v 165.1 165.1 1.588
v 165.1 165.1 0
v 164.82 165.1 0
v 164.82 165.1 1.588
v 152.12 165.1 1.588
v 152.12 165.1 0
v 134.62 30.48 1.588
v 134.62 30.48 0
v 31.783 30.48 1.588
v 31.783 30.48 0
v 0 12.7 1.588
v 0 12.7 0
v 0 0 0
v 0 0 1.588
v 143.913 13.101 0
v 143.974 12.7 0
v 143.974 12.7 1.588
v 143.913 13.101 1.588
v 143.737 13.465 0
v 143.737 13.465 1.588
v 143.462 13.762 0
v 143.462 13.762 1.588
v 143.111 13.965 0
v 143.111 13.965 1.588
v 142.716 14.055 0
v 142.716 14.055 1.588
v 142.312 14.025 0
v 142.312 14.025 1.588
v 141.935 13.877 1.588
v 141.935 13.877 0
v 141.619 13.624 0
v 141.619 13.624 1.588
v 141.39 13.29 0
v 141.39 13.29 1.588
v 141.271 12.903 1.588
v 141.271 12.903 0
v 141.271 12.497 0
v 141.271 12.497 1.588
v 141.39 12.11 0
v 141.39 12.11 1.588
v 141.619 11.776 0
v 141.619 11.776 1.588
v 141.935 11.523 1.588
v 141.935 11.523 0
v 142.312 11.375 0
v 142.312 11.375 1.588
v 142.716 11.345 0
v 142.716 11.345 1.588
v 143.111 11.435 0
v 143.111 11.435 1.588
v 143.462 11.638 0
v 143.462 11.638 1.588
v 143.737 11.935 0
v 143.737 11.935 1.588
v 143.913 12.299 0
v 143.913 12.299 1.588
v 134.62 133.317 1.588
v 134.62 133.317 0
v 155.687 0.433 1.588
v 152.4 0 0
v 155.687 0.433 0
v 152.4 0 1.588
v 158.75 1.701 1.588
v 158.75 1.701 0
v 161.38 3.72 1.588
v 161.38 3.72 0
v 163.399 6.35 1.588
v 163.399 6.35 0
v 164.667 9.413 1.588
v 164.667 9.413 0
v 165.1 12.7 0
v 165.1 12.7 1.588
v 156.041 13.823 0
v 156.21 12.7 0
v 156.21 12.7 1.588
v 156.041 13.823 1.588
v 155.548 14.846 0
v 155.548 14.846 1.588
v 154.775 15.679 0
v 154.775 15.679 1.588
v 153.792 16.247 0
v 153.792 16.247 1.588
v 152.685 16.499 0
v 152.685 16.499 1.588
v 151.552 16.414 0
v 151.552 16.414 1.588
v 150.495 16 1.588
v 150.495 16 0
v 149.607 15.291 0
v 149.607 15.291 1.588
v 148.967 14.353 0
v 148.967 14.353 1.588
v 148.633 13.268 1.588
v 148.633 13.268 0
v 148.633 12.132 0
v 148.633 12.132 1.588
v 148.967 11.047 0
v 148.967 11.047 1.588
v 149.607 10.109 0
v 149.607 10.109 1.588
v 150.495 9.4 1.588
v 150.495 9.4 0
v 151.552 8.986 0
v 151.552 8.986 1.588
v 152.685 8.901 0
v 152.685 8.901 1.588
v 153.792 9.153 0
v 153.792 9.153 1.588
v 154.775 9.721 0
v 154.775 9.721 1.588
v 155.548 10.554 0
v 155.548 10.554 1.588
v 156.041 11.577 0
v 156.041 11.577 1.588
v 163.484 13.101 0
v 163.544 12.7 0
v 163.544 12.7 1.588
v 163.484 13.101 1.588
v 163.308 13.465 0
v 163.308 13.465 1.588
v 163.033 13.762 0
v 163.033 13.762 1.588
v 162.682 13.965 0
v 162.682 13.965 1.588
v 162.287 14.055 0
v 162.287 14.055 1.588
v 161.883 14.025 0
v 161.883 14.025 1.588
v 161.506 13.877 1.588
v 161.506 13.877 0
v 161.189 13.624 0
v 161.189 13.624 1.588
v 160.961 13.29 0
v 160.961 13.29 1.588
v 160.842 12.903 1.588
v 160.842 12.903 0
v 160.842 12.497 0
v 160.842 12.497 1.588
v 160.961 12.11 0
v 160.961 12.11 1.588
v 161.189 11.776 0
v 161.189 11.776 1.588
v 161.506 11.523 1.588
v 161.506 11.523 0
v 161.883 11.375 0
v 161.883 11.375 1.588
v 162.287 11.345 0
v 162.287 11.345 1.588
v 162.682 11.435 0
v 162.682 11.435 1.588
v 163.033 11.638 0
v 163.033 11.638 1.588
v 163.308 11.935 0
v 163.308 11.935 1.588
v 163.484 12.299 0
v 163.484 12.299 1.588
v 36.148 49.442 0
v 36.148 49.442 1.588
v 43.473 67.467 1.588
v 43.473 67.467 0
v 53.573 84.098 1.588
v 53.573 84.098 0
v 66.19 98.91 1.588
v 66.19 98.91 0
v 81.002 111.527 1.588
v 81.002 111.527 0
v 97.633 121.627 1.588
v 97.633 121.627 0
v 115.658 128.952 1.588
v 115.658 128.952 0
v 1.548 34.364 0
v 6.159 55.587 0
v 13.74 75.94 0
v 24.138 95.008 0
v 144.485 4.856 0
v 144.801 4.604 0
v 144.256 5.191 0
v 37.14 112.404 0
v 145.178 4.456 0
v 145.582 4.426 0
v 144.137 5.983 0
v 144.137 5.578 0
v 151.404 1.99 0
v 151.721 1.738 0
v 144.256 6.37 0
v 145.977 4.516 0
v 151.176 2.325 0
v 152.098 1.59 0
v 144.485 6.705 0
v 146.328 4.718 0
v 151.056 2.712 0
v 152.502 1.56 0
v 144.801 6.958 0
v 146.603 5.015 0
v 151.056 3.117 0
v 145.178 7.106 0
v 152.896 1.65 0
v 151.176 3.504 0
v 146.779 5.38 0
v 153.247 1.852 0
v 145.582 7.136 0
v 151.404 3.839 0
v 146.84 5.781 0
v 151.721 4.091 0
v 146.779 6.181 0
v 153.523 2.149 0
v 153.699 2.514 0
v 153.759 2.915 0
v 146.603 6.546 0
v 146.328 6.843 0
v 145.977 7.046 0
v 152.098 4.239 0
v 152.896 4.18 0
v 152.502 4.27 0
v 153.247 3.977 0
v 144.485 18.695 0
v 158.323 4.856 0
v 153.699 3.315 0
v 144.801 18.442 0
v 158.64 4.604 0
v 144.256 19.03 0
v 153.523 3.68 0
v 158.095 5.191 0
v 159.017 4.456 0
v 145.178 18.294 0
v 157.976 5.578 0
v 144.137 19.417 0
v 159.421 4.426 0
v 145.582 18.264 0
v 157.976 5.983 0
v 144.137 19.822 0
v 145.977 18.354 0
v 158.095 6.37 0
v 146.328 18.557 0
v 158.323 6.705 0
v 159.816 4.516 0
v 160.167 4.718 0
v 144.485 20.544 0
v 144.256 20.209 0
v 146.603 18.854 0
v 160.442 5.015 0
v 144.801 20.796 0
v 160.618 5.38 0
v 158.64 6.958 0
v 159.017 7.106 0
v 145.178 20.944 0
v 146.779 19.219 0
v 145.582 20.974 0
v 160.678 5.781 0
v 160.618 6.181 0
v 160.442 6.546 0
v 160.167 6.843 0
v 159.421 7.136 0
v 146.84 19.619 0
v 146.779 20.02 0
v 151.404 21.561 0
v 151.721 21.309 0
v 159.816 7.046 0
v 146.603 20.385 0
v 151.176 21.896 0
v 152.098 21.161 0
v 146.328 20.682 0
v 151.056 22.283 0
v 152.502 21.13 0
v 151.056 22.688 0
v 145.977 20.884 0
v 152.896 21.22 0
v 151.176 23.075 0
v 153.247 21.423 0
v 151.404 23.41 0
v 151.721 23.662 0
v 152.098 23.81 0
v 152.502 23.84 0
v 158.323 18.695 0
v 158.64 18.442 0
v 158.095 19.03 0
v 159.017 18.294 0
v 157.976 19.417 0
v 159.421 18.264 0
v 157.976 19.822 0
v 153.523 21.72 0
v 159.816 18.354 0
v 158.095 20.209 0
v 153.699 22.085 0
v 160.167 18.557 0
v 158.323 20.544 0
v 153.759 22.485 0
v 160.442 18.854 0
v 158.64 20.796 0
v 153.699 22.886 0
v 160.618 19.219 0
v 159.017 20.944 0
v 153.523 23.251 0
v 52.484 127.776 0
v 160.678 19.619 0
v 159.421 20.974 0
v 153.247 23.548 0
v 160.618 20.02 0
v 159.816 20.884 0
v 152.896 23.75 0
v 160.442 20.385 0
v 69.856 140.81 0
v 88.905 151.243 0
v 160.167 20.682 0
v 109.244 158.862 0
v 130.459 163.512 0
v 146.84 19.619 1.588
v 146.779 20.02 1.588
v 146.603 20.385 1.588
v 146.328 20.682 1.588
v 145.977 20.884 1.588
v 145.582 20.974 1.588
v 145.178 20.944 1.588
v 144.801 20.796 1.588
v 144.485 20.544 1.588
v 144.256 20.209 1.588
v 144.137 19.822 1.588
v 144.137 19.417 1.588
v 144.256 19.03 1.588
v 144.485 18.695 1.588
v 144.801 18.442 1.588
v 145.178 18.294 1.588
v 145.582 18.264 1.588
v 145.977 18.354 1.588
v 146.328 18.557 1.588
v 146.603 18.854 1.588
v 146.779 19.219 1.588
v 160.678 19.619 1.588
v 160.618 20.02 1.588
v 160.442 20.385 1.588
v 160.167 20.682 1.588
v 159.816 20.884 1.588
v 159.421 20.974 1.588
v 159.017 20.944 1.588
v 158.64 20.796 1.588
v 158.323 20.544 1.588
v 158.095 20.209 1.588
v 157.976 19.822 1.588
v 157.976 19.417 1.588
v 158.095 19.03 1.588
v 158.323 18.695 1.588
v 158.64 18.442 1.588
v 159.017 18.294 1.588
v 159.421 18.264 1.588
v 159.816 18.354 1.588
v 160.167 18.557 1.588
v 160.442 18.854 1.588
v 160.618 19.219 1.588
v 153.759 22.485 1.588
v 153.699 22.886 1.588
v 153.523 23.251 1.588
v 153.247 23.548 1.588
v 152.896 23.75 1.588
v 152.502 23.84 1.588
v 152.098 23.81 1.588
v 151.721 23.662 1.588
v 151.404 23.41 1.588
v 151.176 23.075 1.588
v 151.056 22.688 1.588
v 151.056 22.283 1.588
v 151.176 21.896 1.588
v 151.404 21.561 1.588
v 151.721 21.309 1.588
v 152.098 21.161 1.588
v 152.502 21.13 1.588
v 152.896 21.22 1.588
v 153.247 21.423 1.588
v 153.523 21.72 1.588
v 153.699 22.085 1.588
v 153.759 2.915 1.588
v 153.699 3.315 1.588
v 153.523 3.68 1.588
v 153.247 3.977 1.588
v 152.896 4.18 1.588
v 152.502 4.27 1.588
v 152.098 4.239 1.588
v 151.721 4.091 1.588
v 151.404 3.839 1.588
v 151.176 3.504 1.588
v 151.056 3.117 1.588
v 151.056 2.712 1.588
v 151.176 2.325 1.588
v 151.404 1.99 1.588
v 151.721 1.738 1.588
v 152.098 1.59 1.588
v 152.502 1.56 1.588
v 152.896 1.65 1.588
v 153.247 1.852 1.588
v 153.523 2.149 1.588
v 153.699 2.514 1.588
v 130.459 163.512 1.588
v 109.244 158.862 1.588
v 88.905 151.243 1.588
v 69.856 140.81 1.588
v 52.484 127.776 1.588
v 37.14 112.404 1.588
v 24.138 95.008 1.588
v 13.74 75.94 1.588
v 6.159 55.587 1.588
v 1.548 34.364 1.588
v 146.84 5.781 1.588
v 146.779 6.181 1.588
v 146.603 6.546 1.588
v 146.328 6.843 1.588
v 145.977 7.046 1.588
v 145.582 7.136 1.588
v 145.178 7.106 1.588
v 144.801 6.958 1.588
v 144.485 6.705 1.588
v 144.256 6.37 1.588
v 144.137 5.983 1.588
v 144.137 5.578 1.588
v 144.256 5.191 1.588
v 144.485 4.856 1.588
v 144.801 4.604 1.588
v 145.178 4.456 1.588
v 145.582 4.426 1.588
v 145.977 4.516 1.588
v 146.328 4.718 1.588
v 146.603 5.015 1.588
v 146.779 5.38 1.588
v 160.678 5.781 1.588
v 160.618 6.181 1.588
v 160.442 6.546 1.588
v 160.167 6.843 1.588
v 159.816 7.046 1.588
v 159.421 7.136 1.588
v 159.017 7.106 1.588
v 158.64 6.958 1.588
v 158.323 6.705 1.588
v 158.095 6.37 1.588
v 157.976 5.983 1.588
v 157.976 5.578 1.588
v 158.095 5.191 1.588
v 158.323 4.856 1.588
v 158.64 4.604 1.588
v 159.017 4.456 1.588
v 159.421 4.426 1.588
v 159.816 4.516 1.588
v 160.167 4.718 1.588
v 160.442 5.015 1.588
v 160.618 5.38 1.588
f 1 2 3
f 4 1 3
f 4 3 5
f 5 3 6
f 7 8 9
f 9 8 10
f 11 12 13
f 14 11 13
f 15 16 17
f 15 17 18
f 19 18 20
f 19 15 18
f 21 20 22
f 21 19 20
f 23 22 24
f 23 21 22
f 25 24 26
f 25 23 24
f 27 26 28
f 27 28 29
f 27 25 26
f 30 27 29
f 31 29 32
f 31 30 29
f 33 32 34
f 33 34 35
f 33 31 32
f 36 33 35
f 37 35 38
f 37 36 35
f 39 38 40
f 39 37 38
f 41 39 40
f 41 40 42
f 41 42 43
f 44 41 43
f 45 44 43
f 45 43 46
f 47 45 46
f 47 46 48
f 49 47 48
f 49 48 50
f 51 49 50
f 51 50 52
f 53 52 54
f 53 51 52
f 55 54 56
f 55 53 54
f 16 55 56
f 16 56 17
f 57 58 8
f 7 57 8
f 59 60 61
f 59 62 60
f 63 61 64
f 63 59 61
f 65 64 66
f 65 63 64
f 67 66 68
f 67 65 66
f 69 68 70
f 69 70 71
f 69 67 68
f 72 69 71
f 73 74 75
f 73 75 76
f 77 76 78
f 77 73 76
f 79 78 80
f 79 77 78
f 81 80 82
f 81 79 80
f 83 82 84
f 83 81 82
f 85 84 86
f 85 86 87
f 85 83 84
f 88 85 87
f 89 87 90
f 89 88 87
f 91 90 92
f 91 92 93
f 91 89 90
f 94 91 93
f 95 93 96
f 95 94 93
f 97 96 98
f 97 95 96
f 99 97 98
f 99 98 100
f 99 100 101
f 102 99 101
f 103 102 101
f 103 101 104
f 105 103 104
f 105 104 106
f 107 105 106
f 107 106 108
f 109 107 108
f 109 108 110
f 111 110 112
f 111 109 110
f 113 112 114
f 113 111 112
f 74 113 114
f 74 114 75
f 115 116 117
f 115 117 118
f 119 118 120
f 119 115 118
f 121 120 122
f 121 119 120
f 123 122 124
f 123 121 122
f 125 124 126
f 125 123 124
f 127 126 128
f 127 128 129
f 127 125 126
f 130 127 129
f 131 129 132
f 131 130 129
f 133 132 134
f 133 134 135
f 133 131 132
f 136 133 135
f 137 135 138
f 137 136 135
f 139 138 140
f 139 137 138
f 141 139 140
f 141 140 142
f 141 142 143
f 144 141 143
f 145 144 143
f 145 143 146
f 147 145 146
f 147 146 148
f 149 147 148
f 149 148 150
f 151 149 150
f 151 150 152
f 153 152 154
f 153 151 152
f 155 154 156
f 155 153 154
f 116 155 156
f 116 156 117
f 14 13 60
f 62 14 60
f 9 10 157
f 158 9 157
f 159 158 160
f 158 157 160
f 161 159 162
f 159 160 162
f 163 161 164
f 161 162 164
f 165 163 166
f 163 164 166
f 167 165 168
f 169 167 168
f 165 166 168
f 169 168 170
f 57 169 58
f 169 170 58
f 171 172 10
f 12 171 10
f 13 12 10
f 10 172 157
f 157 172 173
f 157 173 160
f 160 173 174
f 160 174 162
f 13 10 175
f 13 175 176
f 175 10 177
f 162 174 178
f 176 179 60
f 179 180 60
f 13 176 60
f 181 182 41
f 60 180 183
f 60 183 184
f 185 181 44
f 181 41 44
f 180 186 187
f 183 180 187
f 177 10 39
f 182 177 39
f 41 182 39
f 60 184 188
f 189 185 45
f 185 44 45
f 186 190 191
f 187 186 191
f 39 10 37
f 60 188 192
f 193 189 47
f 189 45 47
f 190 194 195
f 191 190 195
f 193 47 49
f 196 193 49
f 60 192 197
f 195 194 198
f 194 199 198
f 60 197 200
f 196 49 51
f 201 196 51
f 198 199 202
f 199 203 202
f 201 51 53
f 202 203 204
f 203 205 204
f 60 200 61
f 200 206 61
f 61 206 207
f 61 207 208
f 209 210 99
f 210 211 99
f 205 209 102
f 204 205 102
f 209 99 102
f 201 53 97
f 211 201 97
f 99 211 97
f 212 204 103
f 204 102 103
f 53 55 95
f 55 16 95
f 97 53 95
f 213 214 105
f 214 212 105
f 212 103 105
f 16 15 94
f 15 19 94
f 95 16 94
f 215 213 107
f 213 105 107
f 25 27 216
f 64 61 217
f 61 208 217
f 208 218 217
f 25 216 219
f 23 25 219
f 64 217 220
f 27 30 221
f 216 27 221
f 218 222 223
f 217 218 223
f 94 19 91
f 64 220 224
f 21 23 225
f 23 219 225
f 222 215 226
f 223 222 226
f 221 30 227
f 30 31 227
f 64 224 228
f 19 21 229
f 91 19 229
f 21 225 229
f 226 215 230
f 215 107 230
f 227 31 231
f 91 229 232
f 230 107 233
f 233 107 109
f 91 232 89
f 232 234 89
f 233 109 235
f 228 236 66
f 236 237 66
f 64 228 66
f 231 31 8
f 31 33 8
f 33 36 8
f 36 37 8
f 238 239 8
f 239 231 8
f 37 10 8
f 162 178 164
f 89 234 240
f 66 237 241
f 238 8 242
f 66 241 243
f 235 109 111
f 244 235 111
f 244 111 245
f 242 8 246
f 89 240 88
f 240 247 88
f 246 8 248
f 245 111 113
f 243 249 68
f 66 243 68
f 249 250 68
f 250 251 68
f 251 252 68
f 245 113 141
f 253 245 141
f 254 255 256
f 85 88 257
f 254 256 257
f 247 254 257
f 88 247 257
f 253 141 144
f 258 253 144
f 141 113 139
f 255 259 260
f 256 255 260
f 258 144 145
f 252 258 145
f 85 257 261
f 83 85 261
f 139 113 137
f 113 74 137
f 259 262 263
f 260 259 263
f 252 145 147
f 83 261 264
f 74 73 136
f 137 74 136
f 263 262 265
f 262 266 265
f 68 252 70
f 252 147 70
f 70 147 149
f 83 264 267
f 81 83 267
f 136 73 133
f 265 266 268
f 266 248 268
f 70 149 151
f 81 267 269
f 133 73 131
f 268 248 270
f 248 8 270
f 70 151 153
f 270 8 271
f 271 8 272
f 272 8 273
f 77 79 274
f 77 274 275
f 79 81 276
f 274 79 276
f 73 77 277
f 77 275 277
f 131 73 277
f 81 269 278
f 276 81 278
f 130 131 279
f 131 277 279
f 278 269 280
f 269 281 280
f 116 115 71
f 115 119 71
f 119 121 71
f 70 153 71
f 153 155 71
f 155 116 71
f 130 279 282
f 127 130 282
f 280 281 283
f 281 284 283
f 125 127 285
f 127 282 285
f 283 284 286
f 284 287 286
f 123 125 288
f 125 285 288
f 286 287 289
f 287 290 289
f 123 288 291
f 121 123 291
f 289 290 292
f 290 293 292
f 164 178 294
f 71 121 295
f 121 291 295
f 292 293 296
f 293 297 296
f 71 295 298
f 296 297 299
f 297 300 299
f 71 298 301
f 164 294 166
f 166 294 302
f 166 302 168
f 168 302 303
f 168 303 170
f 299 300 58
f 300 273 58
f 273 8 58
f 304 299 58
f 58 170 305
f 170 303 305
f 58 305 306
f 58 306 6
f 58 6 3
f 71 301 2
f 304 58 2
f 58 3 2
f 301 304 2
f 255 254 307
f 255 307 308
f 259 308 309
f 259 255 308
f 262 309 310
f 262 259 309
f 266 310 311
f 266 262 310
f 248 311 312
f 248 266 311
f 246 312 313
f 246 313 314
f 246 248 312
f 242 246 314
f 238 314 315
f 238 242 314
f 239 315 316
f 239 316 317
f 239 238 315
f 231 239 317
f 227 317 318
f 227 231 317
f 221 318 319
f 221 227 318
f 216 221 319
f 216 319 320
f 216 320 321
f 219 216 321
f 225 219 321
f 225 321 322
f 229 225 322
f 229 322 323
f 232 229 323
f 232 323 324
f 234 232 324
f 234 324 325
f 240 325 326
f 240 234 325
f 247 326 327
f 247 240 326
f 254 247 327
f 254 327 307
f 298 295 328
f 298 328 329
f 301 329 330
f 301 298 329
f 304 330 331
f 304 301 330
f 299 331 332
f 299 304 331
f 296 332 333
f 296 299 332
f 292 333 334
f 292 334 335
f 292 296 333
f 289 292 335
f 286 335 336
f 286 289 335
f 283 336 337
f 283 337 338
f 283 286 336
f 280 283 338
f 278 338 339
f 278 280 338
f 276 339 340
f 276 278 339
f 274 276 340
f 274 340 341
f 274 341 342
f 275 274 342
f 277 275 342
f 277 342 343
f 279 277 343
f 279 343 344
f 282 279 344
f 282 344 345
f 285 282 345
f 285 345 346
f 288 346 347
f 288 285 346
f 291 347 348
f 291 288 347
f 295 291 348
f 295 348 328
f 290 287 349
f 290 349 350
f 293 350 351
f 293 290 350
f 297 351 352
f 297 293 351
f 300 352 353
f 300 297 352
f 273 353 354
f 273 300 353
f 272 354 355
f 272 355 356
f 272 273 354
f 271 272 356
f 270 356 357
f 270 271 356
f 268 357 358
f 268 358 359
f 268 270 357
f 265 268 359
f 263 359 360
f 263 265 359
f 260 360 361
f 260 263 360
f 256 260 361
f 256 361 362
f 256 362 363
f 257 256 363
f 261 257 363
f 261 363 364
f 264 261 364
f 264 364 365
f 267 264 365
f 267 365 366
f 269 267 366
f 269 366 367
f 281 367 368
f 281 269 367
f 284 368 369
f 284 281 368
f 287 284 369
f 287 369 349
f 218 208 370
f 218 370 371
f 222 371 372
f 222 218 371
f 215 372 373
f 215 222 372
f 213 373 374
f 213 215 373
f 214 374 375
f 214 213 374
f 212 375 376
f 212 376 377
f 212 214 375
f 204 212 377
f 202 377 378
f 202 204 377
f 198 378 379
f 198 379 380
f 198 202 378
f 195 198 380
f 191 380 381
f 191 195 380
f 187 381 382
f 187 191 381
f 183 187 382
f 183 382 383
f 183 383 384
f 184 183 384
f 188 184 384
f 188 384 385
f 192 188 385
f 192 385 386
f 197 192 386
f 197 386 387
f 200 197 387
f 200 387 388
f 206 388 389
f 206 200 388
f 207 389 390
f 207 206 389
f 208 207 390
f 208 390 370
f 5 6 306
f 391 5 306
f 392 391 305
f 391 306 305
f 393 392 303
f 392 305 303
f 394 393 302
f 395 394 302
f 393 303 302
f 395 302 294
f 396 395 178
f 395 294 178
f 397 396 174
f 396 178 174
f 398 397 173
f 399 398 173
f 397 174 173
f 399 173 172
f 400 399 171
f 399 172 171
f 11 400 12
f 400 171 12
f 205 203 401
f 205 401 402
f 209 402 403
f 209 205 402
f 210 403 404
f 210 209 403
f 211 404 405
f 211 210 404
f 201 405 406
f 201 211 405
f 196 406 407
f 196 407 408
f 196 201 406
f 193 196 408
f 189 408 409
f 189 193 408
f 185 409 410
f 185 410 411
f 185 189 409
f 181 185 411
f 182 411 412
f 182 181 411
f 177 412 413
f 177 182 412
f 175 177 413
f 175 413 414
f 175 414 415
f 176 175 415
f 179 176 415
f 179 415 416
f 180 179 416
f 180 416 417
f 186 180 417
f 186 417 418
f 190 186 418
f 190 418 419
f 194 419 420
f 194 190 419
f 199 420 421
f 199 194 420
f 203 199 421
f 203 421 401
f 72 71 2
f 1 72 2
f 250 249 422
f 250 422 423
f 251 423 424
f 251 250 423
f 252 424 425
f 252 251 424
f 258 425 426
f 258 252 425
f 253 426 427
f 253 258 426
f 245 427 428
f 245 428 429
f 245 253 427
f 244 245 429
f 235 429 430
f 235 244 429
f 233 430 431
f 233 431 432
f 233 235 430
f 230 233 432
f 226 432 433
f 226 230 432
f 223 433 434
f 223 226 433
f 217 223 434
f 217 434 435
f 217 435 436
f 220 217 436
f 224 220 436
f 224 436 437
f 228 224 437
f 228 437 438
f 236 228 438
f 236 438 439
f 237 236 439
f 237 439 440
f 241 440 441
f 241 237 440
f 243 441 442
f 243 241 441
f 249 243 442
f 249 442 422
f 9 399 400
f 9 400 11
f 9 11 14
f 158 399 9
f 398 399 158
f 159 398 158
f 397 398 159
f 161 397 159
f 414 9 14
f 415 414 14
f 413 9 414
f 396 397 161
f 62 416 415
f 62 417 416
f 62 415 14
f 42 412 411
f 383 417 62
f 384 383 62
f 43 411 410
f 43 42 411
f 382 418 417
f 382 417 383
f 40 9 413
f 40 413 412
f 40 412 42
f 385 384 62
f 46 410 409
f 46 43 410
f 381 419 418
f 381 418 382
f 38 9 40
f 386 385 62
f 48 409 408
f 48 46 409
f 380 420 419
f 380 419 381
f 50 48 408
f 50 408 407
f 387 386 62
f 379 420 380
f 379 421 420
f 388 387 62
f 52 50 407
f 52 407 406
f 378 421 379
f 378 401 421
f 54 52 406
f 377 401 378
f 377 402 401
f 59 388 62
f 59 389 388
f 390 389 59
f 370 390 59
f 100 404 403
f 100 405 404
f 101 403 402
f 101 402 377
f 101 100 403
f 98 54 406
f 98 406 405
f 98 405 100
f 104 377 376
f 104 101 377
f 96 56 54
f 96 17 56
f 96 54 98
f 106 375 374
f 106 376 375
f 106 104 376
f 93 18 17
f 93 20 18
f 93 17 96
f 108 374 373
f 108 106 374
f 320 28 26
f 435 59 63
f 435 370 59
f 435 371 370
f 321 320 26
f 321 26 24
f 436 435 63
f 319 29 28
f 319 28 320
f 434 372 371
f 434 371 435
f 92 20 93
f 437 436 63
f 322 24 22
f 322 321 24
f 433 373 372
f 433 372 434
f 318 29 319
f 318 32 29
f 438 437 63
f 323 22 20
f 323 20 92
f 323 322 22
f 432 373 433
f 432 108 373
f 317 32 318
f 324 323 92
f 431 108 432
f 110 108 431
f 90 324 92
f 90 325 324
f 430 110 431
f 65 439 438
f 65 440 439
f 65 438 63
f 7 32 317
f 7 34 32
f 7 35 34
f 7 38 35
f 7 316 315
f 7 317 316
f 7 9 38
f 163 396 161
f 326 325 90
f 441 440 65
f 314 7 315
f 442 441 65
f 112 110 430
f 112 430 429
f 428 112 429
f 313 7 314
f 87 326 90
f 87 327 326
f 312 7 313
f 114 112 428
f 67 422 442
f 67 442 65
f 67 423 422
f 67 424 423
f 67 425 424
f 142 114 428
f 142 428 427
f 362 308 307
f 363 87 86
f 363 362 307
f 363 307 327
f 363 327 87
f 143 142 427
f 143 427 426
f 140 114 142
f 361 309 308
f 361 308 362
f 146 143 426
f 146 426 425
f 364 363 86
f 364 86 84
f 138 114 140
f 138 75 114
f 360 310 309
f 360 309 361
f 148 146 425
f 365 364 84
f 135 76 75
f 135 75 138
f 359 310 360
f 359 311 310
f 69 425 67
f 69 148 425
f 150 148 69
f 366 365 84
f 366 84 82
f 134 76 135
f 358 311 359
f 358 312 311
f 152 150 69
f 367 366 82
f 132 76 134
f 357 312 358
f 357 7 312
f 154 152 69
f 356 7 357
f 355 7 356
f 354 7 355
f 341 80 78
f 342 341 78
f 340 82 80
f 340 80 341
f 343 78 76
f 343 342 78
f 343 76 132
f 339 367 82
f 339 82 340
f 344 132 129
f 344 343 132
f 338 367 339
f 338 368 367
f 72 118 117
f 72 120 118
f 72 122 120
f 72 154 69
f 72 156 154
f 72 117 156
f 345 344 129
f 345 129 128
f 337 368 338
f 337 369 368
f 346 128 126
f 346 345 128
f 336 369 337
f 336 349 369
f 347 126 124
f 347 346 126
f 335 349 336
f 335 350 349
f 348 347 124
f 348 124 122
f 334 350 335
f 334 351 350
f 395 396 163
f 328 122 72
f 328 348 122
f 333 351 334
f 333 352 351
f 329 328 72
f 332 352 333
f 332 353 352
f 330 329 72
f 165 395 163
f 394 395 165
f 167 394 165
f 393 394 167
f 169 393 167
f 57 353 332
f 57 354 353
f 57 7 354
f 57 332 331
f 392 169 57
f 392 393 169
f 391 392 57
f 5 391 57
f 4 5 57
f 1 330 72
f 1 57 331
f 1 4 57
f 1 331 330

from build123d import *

# Parameters (mm, degrees)
F0_R     = 1.3589
F0_R_2   = 3.81
F1_DEPTH = 1.5875
F2_R     = 12.7


with BuildPart() as f1:
    # F0 (on Top) → F1 (new body)
    with BuildSketch(Plane.XY):
        with BuildLine():
            Line((0, 12.7), (0, 0))
            Line((0, 0), (165.1, 0))
            Line((165.1, 0), (165.1, 25.4))
            Line((165.1, 25.4), (165.1, 165.1))
            Line((165.1, 165.1), (164.819603, 165.1))
            Line((164.819603, 165.1), (152.119603, 165.099742))
            ThreePointArc((152.119603, 165.099742), (44.537837, 120.363893), (0, 12.7))
        make_face()
        with Locations((142.61465, 12.7)):
            Circle(F0_R, mode=Mode.SUBTRACT)
        with Locations((152.4, 2.91465)):
            Circle(F0_R, mode=Mode.SUBTRACT)
        with Locations((145.480713, 5.780713)):
            Circle(F0_R, mode=Mode.SUBTRACT)
        with Locations((159.319287, 5.780713)):
            Circle(F0_R, mode=Mode.SUBTRACT)
        with Locations((152.4, 12.7)):
            Circle(F0_R_2, mode=Mode.SUBTRACT)
        with Locations((145.480713, 19.619287)):
            Circle(F0_R, mode=Mode.SUBTRACT)
        with Locations((162.18535, 12.7)):
            Circle(F0_R, mode=Mode.SUBTRACT)
        with Locations((159.319287, 19.619287)):
            Circle(F0_R, mode=Mode.SUBTRACT)
        with Locations((152.4, 22.48535)):
            Circle(F0_R, mode=Mode.SUBTRACT)
        with BuildLine():
            ThreePointArc((31.783426, 30.48), (66.189541, 98.910459), (134.62, 133.316574))
            Line((134.62, 133.316574), (134.62, 30.48))
            Line((134.62, 30.48), (31.783426, 30.48))
        make_face(mode=Mode.SUBTRACT)
    extrude(amount=F1_DEPTH)

    # F2
    f2_edges = [f1.edges().sort_by_distance(p)[0] for p in [
        (165.1, 0, 0.79375),
    ]]
    fillet(f2_edges, radius=F2_R)


solid = f1.part
